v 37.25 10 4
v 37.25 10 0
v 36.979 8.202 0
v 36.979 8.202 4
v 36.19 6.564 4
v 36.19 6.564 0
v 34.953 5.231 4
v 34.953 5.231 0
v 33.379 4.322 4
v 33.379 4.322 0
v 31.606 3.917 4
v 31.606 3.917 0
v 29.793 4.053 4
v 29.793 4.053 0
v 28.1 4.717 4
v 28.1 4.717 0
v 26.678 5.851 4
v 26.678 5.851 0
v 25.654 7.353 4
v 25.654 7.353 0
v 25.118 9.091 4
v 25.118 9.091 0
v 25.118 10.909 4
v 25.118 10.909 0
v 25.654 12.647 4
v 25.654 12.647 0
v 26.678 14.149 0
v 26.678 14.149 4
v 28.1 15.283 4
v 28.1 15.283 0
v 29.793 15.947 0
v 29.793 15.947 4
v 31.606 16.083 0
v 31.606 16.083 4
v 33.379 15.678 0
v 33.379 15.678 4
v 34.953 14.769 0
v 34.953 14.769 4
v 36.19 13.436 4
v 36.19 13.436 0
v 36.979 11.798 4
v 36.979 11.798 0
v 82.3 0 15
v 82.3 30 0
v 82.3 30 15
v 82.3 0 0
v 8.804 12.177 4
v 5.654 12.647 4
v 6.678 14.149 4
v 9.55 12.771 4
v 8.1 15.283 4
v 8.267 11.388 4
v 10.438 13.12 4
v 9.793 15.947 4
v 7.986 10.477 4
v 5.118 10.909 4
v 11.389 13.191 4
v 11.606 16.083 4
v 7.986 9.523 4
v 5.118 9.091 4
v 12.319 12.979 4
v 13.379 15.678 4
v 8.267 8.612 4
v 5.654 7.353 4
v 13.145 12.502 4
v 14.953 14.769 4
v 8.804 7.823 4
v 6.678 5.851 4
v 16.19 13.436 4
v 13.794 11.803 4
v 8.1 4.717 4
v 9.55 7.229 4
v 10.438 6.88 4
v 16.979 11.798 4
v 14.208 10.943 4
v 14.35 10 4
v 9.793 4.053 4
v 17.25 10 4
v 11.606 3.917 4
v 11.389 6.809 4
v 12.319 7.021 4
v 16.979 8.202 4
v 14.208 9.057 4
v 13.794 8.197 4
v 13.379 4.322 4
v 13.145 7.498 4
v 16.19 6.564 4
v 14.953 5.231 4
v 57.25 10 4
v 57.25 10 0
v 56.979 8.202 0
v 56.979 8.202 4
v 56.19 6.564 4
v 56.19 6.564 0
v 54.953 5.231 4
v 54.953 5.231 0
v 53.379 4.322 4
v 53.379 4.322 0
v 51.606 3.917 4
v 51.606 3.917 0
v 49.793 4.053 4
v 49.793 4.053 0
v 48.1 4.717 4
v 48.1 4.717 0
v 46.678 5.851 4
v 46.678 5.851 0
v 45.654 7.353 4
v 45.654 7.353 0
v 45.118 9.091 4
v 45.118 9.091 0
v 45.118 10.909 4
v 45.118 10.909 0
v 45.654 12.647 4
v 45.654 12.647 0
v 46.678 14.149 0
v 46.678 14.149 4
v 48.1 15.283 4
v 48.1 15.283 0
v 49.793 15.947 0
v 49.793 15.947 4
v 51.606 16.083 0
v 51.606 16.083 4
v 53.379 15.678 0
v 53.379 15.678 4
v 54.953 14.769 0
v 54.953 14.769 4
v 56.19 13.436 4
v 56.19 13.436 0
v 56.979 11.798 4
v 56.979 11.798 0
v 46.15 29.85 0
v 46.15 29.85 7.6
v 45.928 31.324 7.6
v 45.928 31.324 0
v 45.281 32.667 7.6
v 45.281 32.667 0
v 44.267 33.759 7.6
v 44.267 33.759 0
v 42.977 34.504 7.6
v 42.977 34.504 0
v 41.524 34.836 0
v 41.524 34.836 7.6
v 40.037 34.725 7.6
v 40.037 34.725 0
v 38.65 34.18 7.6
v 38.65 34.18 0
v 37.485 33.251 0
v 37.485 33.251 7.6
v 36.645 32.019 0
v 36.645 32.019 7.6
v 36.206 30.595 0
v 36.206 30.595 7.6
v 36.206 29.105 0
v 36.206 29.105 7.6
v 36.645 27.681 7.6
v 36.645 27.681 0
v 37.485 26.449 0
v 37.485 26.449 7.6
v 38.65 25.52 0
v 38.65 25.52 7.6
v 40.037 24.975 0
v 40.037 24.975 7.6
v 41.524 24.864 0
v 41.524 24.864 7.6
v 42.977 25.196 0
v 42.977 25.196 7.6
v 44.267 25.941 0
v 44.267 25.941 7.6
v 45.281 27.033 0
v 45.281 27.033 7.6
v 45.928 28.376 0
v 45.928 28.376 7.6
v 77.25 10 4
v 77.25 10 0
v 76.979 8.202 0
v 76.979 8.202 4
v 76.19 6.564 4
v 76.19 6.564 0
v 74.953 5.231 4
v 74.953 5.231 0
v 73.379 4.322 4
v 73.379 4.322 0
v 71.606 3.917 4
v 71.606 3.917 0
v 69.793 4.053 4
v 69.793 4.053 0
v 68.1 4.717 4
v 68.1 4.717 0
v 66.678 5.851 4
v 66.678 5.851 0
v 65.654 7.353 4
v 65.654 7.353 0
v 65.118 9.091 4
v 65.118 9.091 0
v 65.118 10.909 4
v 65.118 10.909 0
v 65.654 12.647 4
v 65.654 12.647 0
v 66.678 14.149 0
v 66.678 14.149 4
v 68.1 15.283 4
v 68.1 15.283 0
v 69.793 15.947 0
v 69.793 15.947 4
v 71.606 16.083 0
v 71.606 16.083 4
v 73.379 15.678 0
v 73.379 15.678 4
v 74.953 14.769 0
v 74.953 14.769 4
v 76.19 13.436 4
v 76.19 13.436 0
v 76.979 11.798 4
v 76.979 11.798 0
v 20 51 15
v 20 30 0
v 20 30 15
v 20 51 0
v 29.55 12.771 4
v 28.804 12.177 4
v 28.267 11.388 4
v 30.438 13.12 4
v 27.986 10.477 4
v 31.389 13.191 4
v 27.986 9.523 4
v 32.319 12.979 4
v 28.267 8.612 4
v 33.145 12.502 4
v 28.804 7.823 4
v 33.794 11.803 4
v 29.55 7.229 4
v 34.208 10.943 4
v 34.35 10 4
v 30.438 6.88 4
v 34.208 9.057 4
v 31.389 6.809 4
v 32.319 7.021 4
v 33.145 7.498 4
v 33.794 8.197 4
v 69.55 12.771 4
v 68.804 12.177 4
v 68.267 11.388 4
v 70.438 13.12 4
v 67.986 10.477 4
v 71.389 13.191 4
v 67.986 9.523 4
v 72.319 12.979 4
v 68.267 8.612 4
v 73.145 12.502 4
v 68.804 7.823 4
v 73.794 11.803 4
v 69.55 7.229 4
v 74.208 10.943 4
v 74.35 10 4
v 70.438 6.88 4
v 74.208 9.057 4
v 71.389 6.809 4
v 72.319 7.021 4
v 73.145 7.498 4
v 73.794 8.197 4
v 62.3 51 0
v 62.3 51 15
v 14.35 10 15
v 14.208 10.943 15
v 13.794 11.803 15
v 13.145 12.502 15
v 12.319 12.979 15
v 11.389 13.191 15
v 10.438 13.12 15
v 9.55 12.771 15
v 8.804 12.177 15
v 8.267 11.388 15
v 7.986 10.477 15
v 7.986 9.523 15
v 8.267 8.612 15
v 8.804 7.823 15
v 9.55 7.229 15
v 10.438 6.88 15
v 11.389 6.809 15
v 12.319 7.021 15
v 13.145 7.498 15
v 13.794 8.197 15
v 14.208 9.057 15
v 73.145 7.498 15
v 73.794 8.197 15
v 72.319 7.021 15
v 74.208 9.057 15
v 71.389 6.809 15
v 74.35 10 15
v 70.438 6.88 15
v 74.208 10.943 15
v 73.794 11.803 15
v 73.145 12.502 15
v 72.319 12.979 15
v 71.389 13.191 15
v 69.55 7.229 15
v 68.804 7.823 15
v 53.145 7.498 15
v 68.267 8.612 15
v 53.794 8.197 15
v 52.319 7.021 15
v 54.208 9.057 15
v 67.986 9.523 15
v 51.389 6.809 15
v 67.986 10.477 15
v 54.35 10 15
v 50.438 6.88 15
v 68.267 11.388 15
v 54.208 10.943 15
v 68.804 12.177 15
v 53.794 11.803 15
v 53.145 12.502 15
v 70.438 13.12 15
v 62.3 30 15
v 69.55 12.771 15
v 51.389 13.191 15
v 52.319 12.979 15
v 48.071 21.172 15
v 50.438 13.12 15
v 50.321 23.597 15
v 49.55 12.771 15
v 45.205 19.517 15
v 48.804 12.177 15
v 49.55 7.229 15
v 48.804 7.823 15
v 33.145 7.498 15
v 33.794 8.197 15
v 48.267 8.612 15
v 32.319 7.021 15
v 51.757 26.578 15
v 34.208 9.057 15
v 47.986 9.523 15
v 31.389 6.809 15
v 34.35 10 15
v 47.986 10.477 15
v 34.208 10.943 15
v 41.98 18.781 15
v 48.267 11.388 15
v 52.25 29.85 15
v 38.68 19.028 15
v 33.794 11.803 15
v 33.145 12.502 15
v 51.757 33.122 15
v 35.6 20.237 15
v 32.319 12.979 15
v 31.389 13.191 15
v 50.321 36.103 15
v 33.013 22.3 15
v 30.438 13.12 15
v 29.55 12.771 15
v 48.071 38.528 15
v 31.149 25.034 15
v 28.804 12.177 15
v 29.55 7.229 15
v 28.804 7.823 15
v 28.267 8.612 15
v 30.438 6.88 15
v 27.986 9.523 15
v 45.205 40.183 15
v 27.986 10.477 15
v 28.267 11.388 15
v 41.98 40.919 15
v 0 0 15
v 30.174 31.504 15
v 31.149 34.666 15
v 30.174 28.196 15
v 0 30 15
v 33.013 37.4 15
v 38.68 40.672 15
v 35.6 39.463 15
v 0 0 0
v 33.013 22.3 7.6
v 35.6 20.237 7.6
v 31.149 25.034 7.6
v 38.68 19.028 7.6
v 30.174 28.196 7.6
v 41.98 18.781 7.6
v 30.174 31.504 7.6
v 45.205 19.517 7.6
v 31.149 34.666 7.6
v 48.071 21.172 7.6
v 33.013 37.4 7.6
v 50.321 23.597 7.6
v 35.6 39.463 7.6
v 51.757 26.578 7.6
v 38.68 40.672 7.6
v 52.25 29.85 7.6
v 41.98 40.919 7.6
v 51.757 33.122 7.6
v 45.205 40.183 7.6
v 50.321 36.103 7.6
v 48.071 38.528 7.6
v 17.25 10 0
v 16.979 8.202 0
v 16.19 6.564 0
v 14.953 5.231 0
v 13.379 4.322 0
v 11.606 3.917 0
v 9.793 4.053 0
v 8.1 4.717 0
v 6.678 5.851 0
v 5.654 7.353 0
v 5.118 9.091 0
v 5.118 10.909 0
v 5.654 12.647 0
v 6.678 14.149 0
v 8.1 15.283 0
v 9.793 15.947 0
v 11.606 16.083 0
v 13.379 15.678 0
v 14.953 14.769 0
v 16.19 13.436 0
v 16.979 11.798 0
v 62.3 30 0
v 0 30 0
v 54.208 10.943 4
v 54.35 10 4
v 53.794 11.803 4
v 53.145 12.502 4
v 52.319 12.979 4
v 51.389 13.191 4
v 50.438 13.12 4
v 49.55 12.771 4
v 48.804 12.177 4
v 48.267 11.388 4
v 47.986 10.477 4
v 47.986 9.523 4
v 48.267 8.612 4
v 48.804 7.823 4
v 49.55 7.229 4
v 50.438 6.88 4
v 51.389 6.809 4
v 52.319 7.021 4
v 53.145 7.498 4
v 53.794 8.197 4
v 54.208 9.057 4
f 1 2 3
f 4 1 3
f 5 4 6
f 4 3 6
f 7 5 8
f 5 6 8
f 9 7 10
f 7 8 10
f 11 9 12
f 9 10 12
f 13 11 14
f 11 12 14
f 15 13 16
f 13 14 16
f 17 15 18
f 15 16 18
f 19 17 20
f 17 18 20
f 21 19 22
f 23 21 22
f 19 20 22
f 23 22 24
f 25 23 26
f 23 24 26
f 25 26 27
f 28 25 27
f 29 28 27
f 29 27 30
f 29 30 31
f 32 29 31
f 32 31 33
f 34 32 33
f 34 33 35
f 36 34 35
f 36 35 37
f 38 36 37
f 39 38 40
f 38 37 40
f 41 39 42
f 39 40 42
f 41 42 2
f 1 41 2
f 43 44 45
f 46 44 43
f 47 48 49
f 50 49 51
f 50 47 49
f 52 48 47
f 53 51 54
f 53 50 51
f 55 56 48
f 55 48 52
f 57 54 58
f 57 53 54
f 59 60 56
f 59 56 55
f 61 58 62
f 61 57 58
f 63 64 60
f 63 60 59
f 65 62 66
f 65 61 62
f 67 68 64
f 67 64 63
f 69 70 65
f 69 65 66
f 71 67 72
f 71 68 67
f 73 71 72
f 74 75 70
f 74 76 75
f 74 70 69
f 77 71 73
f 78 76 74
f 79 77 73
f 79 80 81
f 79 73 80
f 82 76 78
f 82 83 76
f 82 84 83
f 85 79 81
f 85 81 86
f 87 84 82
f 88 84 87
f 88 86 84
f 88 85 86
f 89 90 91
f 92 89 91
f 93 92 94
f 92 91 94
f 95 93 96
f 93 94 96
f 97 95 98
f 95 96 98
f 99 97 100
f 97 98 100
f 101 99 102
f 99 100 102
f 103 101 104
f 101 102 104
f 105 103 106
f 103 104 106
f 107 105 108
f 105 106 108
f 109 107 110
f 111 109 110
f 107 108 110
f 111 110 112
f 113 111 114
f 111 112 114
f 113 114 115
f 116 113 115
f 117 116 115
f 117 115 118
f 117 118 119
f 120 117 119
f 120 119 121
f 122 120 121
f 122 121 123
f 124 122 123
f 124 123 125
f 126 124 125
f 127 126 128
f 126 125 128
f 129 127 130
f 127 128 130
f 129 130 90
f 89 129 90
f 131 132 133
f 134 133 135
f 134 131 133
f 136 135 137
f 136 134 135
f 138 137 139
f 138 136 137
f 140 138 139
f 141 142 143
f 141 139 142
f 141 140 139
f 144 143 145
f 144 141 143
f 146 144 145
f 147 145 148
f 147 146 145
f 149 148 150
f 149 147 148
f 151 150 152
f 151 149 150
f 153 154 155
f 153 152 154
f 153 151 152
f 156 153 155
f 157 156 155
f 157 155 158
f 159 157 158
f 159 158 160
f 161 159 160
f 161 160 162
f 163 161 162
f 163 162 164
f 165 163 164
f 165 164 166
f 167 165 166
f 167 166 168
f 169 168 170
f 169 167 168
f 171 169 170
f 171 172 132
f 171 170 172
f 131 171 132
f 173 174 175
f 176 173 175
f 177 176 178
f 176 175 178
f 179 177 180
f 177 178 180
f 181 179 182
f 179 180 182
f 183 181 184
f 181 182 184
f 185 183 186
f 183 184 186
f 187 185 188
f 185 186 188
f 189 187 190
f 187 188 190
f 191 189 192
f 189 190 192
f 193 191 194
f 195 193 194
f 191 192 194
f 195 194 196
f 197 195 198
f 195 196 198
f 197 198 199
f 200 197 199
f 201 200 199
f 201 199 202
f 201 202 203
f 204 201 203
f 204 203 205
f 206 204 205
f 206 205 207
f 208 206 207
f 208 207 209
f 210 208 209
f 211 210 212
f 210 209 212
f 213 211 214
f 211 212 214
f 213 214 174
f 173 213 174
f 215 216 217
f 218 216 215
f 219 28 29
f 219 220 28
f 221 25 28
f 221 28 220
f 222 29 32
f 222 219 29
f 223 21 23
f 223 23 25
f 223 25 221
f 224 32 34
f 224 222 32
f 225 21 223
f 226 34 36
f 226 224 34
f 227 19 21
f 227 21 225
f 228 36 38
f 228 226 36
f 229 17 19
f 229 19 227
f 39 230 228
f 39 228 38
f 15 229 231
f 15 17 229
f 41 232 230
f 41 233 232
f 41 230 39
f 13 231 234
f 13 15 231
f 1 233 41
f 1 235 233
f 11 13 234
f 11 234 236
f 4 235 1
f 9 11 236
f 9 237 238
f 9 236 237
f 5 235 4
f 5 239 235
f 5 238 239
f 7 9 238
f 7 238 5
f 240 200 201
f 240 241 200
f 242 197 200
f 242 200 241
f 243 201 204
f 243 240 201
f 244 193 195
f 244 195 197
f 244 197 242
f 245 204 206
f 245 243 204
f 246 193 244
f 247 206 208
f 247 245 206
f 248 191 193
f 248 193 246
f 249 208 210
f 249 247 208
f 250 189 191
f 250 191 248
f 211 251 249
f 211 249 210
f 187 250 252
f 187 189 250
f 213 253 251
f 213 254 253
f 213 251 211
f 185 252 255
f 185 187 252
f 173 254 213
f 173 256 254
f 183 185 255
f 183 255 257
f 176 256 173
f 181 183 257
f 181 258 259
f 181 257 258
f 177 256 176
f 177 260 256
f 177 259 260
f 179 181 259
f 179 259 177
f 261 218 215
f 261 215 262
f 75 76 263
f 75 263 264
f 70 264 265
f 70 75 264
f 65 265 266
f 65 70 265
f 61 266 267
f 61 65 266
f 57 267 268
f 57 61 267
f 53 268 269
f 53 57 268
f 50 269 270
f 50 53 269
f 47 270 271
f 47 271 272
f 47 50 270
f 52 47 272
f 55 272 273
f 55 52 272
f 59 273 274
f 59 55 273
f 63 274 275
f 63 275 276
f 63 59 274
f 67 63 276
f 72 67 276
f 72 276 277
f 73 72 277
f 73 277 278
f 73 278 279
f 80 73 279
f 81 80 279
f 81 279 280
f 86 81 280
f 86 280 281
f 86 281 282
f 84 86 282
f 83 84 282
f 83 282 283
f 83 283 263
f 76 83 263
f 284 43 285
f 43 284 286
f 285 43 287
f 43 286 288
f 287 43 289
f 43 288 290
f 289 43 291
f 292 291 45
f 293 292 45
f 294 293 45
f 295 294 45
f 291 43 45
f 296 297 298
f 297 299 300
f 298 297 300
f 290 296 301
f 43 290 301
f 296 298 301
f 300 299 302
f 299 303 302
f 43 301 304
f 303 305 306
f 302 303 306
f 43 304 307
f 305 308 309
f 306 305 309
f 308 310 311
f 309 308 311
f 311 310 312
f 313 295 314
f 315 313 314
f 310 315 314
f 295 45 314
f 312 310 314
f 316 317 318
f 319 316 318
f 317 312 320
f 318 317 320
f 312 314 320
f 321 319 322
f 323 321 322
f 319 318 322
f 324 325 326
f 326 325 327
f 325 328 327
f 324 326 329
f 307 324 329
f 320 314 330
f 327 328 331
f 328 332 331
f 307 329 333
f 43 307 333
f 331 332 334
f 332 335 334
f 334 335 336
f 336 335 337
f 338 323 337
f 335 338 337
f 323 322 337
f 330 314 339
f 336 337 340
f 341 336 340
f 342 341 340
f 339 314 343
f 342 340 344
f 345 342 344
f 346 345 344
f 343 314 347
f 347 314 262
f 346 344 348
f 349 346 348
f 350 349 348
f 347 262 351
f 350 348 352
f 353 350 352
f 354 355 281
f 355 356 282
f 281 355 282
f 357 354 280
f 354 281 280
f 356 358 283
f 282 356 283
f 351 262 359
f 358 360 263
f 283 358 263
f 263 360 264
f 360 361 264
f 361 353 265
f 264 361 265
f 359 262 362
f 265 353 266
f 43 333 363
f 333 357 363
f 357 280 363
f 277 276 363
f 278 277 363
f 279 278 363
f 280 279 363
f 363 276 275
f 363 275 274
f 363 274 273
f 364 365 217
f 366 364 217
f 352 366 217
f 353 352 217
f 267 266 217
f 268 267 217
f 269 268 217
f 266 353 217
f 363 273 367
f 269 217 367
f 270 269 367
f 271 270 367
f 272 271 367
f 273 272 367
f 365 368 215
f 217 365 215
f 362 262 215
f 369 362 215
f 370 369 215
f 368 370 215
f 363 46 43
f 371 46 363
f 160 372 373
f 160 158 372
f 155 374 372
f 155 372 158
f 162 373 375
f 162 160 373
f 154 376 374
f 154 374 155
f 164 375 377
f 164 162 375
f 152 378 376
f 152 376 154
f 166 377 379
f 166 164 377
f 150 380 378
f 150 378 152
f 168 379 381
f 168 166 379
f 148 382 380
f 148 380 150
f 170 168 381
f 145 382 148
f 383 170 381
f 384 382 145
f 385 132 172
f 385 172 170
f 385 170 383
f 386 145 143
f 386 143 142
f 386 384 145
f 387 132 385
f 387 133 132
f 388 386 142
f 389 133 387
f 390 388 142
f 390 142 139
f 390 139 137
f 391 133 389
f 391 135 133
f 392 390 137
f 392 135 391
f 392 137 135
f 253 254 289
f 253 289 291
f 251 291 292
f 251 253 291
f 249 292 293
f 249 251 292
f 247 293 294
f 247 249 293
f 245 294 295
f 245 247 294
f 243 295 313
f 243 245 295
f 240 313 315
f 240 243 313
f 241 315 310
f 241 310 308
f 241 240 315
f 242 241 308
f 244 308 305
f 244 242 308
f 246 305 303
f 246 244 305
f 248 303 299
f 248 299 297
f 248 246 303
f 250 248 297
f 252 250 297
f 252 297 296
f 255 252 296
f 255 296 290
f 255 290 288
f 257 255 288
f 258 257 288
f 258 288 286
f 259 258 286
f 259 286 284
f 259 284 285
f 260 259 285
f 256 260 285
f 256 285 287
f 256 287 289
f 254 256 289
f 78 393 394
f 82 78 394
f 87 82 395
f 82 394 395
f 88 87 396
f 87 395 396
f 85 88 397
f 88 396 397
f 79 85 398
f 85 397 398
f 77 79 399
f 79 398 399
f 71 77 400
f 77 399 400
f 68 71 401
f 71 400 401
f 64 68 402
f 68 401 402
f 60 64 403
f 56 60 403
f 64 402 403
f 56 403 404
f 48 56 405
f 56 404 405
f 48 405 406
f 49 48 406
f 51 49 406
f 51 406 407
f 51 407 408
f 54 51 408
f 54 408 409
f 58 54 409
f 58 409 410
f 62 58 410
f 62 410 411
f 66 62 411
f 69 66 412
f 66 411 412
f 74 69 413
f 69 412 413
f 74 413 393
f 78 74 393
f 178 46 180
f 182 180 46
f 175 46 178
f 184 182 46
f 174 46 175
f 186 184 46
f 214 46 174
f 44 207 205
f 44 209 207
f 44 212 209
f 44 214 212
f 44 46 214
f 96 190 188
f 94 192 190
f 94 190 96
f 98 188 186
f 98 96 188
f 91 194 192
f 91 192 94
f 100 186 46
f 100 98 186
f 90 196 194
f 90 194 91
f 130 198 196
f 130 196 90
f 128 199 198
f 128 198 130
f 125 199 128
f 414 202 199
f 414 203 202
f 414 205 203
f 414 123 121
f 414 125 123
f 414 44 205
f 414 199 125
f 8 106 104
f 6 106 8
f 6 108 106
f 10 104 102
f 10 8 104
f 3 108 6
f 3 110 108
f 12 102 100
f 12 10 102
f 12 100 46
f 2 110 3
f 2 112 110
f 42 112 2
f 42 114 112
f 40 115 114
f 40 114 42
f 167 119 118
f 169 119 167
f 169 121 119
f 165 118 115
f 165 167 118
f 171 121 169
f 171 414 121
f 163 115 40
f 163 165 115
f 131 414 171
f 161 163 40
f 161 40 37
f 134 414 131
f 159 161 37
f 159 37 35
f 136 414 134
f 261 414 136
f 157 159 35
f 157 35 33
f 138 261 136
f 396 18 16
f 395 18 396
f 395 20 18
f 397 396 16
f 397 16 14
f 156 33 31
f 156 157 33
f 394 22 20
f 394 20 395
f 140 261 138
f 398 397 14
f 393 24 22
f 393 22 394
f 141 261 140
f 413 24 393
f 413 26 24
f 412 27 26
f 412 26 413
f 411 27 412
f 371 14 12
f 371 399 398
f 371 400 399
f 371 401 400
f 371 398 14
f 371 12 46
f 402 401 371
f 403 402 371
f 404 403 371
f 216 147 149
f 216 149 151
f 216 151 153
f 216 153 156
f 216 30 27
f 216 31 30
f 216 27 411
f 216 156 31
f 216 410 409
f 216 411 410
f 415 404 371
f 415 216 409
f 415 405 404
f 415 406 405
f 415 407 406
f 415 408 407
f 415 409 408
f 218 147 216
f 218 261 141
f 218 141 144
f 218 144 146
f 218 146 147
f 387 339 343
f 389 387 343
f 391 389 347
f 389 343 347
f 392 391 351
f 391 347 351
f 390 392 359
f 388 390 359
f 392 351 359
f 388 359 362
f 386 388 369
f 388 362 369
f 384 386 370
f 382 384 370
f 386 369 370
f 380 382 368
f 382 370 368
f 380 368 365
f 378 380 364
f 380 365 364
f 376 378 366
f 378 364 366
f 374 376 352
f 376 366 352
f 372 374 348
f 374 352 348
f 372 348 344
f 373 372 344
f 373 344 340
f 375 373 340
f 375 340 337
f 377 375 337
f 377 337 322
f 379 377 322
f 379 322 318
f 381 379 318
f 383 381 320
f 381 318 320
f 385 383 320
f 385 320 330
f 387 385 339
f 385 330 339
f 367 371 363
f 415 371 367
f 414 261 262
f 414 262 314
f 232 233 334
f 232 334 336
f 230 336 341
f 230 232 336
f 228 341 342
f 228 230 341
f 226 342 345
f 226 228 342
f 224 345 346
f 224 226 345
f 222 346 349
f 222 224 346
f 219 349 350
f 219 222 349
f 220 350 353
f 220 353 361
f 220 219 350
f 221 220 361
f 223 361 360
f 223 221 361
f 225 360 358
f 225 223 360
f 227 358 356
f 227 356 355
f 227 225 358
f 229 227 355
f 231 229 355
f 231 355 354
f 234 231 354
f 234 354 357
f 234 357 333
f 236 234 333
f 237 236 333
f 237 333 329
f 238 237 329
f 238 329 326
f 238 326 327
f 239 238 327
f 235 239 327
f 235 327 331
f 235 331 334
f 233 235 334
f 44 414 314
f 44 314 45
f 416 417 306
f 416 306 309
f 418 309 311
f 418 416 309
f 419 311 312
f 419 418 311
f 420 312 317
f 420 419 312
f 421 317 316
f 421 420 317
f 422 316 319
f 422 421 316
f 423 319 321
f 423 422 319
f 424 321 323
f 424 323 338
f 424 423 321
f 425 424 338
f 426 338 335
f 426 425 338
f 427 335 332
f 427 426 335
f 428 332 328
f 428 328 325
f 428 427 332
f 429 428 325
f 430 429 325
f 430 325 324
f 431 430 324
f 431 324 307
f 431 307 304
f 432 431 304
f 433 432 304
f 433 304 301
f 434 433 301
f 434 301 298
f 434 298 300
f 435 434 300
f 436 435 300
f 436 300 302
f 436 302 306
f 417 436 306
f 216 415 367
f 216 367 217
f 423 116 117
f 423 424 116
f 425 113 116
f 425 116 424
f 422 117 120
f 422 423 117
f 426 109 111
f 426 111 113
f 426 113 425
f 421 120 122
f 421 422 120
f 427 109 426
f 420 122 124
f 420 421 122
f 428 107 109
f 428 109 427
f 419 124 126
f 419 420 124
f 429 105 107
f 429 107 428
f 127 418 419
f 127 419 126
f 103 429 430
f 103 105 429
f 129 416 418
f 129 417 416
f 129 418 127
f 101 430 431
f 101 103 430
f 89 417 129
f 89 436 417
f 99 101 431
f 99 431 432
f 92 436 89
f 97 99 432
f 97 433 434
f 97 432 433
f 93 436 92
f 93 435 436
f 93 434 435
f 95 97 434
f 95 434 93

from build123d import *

# Parameters (mm, degrees)
SKETCH_R        = 5
SKETCH_R_2      = 3.2
PAD_DEPTH       = 15
SKETCH002_R     = 6.1
POCKET001_DEPTH = 4
SKETCH003_R     = 11.1
POCKET_DEPTH    = 7.4


with BuildPart() as part:
    # Sketch → Pad (new body)
    with BuildSketch(Plane.XY):
        Polygon((20, 30), (20, 51), (62.3, 51), (62.3, 30), (82.3, 30), (82.3, 0), (0, 0), (0, 30), align=None)
        with Locations((41.15, 29.85)):
            Circle(SKETCH_R, mode=Mode.SUBTRACT)
        with Locations((11.15, 10)):
            Circle(SKETCH_R_2, mode=Mode.SUBTRACT)
        with Locations((31.15, 10)):
            Circle(SKETCH_R_2, mode=Mode.SUBTRACT)
        with Locations((51.15, 10)):
            Circle(SKETCH_R_2, mode=Mode.SUBTRACT)
        with Locations((71.15, 10)):
            Circle(SKETCH_R_2, mode=Mode.SUBTRACT)
    extrude(amount=PAD_DEPTH)

    # Sketch002 → Pocket001 (cut)
    with BuildSketch(Plane(origin=(0, 0, 0), x_dir=(1, 0, 0), z_dir=(0, 0, -1))):
        with Locations((11.15, -10)):
            Circle(SKETCH002_R)
        with Locations((31.15, -10)):
            Circle(SKETCH002_R)
        with Locations((51.15, -10)):
            Circle(SKETCH002_R)
        with Locations((71.15, -10)):
            Circle(SKETCH002_R)
    extrude(amount=-POCKET001_DEPTH, mode=Mode.SUBTRACT)

    # Sketch003 (on Face5 of Pocket001) → Pocket (cut)
    with BuildSketch(Plane.XY.offset(15)):
        with Locations((41.15, 29.85)):
            Circle(SKETCH003_R)
    extrude(amount=-POCKET_DEPTH, mode=Mode.SUBTRACT)


solid = part.part
